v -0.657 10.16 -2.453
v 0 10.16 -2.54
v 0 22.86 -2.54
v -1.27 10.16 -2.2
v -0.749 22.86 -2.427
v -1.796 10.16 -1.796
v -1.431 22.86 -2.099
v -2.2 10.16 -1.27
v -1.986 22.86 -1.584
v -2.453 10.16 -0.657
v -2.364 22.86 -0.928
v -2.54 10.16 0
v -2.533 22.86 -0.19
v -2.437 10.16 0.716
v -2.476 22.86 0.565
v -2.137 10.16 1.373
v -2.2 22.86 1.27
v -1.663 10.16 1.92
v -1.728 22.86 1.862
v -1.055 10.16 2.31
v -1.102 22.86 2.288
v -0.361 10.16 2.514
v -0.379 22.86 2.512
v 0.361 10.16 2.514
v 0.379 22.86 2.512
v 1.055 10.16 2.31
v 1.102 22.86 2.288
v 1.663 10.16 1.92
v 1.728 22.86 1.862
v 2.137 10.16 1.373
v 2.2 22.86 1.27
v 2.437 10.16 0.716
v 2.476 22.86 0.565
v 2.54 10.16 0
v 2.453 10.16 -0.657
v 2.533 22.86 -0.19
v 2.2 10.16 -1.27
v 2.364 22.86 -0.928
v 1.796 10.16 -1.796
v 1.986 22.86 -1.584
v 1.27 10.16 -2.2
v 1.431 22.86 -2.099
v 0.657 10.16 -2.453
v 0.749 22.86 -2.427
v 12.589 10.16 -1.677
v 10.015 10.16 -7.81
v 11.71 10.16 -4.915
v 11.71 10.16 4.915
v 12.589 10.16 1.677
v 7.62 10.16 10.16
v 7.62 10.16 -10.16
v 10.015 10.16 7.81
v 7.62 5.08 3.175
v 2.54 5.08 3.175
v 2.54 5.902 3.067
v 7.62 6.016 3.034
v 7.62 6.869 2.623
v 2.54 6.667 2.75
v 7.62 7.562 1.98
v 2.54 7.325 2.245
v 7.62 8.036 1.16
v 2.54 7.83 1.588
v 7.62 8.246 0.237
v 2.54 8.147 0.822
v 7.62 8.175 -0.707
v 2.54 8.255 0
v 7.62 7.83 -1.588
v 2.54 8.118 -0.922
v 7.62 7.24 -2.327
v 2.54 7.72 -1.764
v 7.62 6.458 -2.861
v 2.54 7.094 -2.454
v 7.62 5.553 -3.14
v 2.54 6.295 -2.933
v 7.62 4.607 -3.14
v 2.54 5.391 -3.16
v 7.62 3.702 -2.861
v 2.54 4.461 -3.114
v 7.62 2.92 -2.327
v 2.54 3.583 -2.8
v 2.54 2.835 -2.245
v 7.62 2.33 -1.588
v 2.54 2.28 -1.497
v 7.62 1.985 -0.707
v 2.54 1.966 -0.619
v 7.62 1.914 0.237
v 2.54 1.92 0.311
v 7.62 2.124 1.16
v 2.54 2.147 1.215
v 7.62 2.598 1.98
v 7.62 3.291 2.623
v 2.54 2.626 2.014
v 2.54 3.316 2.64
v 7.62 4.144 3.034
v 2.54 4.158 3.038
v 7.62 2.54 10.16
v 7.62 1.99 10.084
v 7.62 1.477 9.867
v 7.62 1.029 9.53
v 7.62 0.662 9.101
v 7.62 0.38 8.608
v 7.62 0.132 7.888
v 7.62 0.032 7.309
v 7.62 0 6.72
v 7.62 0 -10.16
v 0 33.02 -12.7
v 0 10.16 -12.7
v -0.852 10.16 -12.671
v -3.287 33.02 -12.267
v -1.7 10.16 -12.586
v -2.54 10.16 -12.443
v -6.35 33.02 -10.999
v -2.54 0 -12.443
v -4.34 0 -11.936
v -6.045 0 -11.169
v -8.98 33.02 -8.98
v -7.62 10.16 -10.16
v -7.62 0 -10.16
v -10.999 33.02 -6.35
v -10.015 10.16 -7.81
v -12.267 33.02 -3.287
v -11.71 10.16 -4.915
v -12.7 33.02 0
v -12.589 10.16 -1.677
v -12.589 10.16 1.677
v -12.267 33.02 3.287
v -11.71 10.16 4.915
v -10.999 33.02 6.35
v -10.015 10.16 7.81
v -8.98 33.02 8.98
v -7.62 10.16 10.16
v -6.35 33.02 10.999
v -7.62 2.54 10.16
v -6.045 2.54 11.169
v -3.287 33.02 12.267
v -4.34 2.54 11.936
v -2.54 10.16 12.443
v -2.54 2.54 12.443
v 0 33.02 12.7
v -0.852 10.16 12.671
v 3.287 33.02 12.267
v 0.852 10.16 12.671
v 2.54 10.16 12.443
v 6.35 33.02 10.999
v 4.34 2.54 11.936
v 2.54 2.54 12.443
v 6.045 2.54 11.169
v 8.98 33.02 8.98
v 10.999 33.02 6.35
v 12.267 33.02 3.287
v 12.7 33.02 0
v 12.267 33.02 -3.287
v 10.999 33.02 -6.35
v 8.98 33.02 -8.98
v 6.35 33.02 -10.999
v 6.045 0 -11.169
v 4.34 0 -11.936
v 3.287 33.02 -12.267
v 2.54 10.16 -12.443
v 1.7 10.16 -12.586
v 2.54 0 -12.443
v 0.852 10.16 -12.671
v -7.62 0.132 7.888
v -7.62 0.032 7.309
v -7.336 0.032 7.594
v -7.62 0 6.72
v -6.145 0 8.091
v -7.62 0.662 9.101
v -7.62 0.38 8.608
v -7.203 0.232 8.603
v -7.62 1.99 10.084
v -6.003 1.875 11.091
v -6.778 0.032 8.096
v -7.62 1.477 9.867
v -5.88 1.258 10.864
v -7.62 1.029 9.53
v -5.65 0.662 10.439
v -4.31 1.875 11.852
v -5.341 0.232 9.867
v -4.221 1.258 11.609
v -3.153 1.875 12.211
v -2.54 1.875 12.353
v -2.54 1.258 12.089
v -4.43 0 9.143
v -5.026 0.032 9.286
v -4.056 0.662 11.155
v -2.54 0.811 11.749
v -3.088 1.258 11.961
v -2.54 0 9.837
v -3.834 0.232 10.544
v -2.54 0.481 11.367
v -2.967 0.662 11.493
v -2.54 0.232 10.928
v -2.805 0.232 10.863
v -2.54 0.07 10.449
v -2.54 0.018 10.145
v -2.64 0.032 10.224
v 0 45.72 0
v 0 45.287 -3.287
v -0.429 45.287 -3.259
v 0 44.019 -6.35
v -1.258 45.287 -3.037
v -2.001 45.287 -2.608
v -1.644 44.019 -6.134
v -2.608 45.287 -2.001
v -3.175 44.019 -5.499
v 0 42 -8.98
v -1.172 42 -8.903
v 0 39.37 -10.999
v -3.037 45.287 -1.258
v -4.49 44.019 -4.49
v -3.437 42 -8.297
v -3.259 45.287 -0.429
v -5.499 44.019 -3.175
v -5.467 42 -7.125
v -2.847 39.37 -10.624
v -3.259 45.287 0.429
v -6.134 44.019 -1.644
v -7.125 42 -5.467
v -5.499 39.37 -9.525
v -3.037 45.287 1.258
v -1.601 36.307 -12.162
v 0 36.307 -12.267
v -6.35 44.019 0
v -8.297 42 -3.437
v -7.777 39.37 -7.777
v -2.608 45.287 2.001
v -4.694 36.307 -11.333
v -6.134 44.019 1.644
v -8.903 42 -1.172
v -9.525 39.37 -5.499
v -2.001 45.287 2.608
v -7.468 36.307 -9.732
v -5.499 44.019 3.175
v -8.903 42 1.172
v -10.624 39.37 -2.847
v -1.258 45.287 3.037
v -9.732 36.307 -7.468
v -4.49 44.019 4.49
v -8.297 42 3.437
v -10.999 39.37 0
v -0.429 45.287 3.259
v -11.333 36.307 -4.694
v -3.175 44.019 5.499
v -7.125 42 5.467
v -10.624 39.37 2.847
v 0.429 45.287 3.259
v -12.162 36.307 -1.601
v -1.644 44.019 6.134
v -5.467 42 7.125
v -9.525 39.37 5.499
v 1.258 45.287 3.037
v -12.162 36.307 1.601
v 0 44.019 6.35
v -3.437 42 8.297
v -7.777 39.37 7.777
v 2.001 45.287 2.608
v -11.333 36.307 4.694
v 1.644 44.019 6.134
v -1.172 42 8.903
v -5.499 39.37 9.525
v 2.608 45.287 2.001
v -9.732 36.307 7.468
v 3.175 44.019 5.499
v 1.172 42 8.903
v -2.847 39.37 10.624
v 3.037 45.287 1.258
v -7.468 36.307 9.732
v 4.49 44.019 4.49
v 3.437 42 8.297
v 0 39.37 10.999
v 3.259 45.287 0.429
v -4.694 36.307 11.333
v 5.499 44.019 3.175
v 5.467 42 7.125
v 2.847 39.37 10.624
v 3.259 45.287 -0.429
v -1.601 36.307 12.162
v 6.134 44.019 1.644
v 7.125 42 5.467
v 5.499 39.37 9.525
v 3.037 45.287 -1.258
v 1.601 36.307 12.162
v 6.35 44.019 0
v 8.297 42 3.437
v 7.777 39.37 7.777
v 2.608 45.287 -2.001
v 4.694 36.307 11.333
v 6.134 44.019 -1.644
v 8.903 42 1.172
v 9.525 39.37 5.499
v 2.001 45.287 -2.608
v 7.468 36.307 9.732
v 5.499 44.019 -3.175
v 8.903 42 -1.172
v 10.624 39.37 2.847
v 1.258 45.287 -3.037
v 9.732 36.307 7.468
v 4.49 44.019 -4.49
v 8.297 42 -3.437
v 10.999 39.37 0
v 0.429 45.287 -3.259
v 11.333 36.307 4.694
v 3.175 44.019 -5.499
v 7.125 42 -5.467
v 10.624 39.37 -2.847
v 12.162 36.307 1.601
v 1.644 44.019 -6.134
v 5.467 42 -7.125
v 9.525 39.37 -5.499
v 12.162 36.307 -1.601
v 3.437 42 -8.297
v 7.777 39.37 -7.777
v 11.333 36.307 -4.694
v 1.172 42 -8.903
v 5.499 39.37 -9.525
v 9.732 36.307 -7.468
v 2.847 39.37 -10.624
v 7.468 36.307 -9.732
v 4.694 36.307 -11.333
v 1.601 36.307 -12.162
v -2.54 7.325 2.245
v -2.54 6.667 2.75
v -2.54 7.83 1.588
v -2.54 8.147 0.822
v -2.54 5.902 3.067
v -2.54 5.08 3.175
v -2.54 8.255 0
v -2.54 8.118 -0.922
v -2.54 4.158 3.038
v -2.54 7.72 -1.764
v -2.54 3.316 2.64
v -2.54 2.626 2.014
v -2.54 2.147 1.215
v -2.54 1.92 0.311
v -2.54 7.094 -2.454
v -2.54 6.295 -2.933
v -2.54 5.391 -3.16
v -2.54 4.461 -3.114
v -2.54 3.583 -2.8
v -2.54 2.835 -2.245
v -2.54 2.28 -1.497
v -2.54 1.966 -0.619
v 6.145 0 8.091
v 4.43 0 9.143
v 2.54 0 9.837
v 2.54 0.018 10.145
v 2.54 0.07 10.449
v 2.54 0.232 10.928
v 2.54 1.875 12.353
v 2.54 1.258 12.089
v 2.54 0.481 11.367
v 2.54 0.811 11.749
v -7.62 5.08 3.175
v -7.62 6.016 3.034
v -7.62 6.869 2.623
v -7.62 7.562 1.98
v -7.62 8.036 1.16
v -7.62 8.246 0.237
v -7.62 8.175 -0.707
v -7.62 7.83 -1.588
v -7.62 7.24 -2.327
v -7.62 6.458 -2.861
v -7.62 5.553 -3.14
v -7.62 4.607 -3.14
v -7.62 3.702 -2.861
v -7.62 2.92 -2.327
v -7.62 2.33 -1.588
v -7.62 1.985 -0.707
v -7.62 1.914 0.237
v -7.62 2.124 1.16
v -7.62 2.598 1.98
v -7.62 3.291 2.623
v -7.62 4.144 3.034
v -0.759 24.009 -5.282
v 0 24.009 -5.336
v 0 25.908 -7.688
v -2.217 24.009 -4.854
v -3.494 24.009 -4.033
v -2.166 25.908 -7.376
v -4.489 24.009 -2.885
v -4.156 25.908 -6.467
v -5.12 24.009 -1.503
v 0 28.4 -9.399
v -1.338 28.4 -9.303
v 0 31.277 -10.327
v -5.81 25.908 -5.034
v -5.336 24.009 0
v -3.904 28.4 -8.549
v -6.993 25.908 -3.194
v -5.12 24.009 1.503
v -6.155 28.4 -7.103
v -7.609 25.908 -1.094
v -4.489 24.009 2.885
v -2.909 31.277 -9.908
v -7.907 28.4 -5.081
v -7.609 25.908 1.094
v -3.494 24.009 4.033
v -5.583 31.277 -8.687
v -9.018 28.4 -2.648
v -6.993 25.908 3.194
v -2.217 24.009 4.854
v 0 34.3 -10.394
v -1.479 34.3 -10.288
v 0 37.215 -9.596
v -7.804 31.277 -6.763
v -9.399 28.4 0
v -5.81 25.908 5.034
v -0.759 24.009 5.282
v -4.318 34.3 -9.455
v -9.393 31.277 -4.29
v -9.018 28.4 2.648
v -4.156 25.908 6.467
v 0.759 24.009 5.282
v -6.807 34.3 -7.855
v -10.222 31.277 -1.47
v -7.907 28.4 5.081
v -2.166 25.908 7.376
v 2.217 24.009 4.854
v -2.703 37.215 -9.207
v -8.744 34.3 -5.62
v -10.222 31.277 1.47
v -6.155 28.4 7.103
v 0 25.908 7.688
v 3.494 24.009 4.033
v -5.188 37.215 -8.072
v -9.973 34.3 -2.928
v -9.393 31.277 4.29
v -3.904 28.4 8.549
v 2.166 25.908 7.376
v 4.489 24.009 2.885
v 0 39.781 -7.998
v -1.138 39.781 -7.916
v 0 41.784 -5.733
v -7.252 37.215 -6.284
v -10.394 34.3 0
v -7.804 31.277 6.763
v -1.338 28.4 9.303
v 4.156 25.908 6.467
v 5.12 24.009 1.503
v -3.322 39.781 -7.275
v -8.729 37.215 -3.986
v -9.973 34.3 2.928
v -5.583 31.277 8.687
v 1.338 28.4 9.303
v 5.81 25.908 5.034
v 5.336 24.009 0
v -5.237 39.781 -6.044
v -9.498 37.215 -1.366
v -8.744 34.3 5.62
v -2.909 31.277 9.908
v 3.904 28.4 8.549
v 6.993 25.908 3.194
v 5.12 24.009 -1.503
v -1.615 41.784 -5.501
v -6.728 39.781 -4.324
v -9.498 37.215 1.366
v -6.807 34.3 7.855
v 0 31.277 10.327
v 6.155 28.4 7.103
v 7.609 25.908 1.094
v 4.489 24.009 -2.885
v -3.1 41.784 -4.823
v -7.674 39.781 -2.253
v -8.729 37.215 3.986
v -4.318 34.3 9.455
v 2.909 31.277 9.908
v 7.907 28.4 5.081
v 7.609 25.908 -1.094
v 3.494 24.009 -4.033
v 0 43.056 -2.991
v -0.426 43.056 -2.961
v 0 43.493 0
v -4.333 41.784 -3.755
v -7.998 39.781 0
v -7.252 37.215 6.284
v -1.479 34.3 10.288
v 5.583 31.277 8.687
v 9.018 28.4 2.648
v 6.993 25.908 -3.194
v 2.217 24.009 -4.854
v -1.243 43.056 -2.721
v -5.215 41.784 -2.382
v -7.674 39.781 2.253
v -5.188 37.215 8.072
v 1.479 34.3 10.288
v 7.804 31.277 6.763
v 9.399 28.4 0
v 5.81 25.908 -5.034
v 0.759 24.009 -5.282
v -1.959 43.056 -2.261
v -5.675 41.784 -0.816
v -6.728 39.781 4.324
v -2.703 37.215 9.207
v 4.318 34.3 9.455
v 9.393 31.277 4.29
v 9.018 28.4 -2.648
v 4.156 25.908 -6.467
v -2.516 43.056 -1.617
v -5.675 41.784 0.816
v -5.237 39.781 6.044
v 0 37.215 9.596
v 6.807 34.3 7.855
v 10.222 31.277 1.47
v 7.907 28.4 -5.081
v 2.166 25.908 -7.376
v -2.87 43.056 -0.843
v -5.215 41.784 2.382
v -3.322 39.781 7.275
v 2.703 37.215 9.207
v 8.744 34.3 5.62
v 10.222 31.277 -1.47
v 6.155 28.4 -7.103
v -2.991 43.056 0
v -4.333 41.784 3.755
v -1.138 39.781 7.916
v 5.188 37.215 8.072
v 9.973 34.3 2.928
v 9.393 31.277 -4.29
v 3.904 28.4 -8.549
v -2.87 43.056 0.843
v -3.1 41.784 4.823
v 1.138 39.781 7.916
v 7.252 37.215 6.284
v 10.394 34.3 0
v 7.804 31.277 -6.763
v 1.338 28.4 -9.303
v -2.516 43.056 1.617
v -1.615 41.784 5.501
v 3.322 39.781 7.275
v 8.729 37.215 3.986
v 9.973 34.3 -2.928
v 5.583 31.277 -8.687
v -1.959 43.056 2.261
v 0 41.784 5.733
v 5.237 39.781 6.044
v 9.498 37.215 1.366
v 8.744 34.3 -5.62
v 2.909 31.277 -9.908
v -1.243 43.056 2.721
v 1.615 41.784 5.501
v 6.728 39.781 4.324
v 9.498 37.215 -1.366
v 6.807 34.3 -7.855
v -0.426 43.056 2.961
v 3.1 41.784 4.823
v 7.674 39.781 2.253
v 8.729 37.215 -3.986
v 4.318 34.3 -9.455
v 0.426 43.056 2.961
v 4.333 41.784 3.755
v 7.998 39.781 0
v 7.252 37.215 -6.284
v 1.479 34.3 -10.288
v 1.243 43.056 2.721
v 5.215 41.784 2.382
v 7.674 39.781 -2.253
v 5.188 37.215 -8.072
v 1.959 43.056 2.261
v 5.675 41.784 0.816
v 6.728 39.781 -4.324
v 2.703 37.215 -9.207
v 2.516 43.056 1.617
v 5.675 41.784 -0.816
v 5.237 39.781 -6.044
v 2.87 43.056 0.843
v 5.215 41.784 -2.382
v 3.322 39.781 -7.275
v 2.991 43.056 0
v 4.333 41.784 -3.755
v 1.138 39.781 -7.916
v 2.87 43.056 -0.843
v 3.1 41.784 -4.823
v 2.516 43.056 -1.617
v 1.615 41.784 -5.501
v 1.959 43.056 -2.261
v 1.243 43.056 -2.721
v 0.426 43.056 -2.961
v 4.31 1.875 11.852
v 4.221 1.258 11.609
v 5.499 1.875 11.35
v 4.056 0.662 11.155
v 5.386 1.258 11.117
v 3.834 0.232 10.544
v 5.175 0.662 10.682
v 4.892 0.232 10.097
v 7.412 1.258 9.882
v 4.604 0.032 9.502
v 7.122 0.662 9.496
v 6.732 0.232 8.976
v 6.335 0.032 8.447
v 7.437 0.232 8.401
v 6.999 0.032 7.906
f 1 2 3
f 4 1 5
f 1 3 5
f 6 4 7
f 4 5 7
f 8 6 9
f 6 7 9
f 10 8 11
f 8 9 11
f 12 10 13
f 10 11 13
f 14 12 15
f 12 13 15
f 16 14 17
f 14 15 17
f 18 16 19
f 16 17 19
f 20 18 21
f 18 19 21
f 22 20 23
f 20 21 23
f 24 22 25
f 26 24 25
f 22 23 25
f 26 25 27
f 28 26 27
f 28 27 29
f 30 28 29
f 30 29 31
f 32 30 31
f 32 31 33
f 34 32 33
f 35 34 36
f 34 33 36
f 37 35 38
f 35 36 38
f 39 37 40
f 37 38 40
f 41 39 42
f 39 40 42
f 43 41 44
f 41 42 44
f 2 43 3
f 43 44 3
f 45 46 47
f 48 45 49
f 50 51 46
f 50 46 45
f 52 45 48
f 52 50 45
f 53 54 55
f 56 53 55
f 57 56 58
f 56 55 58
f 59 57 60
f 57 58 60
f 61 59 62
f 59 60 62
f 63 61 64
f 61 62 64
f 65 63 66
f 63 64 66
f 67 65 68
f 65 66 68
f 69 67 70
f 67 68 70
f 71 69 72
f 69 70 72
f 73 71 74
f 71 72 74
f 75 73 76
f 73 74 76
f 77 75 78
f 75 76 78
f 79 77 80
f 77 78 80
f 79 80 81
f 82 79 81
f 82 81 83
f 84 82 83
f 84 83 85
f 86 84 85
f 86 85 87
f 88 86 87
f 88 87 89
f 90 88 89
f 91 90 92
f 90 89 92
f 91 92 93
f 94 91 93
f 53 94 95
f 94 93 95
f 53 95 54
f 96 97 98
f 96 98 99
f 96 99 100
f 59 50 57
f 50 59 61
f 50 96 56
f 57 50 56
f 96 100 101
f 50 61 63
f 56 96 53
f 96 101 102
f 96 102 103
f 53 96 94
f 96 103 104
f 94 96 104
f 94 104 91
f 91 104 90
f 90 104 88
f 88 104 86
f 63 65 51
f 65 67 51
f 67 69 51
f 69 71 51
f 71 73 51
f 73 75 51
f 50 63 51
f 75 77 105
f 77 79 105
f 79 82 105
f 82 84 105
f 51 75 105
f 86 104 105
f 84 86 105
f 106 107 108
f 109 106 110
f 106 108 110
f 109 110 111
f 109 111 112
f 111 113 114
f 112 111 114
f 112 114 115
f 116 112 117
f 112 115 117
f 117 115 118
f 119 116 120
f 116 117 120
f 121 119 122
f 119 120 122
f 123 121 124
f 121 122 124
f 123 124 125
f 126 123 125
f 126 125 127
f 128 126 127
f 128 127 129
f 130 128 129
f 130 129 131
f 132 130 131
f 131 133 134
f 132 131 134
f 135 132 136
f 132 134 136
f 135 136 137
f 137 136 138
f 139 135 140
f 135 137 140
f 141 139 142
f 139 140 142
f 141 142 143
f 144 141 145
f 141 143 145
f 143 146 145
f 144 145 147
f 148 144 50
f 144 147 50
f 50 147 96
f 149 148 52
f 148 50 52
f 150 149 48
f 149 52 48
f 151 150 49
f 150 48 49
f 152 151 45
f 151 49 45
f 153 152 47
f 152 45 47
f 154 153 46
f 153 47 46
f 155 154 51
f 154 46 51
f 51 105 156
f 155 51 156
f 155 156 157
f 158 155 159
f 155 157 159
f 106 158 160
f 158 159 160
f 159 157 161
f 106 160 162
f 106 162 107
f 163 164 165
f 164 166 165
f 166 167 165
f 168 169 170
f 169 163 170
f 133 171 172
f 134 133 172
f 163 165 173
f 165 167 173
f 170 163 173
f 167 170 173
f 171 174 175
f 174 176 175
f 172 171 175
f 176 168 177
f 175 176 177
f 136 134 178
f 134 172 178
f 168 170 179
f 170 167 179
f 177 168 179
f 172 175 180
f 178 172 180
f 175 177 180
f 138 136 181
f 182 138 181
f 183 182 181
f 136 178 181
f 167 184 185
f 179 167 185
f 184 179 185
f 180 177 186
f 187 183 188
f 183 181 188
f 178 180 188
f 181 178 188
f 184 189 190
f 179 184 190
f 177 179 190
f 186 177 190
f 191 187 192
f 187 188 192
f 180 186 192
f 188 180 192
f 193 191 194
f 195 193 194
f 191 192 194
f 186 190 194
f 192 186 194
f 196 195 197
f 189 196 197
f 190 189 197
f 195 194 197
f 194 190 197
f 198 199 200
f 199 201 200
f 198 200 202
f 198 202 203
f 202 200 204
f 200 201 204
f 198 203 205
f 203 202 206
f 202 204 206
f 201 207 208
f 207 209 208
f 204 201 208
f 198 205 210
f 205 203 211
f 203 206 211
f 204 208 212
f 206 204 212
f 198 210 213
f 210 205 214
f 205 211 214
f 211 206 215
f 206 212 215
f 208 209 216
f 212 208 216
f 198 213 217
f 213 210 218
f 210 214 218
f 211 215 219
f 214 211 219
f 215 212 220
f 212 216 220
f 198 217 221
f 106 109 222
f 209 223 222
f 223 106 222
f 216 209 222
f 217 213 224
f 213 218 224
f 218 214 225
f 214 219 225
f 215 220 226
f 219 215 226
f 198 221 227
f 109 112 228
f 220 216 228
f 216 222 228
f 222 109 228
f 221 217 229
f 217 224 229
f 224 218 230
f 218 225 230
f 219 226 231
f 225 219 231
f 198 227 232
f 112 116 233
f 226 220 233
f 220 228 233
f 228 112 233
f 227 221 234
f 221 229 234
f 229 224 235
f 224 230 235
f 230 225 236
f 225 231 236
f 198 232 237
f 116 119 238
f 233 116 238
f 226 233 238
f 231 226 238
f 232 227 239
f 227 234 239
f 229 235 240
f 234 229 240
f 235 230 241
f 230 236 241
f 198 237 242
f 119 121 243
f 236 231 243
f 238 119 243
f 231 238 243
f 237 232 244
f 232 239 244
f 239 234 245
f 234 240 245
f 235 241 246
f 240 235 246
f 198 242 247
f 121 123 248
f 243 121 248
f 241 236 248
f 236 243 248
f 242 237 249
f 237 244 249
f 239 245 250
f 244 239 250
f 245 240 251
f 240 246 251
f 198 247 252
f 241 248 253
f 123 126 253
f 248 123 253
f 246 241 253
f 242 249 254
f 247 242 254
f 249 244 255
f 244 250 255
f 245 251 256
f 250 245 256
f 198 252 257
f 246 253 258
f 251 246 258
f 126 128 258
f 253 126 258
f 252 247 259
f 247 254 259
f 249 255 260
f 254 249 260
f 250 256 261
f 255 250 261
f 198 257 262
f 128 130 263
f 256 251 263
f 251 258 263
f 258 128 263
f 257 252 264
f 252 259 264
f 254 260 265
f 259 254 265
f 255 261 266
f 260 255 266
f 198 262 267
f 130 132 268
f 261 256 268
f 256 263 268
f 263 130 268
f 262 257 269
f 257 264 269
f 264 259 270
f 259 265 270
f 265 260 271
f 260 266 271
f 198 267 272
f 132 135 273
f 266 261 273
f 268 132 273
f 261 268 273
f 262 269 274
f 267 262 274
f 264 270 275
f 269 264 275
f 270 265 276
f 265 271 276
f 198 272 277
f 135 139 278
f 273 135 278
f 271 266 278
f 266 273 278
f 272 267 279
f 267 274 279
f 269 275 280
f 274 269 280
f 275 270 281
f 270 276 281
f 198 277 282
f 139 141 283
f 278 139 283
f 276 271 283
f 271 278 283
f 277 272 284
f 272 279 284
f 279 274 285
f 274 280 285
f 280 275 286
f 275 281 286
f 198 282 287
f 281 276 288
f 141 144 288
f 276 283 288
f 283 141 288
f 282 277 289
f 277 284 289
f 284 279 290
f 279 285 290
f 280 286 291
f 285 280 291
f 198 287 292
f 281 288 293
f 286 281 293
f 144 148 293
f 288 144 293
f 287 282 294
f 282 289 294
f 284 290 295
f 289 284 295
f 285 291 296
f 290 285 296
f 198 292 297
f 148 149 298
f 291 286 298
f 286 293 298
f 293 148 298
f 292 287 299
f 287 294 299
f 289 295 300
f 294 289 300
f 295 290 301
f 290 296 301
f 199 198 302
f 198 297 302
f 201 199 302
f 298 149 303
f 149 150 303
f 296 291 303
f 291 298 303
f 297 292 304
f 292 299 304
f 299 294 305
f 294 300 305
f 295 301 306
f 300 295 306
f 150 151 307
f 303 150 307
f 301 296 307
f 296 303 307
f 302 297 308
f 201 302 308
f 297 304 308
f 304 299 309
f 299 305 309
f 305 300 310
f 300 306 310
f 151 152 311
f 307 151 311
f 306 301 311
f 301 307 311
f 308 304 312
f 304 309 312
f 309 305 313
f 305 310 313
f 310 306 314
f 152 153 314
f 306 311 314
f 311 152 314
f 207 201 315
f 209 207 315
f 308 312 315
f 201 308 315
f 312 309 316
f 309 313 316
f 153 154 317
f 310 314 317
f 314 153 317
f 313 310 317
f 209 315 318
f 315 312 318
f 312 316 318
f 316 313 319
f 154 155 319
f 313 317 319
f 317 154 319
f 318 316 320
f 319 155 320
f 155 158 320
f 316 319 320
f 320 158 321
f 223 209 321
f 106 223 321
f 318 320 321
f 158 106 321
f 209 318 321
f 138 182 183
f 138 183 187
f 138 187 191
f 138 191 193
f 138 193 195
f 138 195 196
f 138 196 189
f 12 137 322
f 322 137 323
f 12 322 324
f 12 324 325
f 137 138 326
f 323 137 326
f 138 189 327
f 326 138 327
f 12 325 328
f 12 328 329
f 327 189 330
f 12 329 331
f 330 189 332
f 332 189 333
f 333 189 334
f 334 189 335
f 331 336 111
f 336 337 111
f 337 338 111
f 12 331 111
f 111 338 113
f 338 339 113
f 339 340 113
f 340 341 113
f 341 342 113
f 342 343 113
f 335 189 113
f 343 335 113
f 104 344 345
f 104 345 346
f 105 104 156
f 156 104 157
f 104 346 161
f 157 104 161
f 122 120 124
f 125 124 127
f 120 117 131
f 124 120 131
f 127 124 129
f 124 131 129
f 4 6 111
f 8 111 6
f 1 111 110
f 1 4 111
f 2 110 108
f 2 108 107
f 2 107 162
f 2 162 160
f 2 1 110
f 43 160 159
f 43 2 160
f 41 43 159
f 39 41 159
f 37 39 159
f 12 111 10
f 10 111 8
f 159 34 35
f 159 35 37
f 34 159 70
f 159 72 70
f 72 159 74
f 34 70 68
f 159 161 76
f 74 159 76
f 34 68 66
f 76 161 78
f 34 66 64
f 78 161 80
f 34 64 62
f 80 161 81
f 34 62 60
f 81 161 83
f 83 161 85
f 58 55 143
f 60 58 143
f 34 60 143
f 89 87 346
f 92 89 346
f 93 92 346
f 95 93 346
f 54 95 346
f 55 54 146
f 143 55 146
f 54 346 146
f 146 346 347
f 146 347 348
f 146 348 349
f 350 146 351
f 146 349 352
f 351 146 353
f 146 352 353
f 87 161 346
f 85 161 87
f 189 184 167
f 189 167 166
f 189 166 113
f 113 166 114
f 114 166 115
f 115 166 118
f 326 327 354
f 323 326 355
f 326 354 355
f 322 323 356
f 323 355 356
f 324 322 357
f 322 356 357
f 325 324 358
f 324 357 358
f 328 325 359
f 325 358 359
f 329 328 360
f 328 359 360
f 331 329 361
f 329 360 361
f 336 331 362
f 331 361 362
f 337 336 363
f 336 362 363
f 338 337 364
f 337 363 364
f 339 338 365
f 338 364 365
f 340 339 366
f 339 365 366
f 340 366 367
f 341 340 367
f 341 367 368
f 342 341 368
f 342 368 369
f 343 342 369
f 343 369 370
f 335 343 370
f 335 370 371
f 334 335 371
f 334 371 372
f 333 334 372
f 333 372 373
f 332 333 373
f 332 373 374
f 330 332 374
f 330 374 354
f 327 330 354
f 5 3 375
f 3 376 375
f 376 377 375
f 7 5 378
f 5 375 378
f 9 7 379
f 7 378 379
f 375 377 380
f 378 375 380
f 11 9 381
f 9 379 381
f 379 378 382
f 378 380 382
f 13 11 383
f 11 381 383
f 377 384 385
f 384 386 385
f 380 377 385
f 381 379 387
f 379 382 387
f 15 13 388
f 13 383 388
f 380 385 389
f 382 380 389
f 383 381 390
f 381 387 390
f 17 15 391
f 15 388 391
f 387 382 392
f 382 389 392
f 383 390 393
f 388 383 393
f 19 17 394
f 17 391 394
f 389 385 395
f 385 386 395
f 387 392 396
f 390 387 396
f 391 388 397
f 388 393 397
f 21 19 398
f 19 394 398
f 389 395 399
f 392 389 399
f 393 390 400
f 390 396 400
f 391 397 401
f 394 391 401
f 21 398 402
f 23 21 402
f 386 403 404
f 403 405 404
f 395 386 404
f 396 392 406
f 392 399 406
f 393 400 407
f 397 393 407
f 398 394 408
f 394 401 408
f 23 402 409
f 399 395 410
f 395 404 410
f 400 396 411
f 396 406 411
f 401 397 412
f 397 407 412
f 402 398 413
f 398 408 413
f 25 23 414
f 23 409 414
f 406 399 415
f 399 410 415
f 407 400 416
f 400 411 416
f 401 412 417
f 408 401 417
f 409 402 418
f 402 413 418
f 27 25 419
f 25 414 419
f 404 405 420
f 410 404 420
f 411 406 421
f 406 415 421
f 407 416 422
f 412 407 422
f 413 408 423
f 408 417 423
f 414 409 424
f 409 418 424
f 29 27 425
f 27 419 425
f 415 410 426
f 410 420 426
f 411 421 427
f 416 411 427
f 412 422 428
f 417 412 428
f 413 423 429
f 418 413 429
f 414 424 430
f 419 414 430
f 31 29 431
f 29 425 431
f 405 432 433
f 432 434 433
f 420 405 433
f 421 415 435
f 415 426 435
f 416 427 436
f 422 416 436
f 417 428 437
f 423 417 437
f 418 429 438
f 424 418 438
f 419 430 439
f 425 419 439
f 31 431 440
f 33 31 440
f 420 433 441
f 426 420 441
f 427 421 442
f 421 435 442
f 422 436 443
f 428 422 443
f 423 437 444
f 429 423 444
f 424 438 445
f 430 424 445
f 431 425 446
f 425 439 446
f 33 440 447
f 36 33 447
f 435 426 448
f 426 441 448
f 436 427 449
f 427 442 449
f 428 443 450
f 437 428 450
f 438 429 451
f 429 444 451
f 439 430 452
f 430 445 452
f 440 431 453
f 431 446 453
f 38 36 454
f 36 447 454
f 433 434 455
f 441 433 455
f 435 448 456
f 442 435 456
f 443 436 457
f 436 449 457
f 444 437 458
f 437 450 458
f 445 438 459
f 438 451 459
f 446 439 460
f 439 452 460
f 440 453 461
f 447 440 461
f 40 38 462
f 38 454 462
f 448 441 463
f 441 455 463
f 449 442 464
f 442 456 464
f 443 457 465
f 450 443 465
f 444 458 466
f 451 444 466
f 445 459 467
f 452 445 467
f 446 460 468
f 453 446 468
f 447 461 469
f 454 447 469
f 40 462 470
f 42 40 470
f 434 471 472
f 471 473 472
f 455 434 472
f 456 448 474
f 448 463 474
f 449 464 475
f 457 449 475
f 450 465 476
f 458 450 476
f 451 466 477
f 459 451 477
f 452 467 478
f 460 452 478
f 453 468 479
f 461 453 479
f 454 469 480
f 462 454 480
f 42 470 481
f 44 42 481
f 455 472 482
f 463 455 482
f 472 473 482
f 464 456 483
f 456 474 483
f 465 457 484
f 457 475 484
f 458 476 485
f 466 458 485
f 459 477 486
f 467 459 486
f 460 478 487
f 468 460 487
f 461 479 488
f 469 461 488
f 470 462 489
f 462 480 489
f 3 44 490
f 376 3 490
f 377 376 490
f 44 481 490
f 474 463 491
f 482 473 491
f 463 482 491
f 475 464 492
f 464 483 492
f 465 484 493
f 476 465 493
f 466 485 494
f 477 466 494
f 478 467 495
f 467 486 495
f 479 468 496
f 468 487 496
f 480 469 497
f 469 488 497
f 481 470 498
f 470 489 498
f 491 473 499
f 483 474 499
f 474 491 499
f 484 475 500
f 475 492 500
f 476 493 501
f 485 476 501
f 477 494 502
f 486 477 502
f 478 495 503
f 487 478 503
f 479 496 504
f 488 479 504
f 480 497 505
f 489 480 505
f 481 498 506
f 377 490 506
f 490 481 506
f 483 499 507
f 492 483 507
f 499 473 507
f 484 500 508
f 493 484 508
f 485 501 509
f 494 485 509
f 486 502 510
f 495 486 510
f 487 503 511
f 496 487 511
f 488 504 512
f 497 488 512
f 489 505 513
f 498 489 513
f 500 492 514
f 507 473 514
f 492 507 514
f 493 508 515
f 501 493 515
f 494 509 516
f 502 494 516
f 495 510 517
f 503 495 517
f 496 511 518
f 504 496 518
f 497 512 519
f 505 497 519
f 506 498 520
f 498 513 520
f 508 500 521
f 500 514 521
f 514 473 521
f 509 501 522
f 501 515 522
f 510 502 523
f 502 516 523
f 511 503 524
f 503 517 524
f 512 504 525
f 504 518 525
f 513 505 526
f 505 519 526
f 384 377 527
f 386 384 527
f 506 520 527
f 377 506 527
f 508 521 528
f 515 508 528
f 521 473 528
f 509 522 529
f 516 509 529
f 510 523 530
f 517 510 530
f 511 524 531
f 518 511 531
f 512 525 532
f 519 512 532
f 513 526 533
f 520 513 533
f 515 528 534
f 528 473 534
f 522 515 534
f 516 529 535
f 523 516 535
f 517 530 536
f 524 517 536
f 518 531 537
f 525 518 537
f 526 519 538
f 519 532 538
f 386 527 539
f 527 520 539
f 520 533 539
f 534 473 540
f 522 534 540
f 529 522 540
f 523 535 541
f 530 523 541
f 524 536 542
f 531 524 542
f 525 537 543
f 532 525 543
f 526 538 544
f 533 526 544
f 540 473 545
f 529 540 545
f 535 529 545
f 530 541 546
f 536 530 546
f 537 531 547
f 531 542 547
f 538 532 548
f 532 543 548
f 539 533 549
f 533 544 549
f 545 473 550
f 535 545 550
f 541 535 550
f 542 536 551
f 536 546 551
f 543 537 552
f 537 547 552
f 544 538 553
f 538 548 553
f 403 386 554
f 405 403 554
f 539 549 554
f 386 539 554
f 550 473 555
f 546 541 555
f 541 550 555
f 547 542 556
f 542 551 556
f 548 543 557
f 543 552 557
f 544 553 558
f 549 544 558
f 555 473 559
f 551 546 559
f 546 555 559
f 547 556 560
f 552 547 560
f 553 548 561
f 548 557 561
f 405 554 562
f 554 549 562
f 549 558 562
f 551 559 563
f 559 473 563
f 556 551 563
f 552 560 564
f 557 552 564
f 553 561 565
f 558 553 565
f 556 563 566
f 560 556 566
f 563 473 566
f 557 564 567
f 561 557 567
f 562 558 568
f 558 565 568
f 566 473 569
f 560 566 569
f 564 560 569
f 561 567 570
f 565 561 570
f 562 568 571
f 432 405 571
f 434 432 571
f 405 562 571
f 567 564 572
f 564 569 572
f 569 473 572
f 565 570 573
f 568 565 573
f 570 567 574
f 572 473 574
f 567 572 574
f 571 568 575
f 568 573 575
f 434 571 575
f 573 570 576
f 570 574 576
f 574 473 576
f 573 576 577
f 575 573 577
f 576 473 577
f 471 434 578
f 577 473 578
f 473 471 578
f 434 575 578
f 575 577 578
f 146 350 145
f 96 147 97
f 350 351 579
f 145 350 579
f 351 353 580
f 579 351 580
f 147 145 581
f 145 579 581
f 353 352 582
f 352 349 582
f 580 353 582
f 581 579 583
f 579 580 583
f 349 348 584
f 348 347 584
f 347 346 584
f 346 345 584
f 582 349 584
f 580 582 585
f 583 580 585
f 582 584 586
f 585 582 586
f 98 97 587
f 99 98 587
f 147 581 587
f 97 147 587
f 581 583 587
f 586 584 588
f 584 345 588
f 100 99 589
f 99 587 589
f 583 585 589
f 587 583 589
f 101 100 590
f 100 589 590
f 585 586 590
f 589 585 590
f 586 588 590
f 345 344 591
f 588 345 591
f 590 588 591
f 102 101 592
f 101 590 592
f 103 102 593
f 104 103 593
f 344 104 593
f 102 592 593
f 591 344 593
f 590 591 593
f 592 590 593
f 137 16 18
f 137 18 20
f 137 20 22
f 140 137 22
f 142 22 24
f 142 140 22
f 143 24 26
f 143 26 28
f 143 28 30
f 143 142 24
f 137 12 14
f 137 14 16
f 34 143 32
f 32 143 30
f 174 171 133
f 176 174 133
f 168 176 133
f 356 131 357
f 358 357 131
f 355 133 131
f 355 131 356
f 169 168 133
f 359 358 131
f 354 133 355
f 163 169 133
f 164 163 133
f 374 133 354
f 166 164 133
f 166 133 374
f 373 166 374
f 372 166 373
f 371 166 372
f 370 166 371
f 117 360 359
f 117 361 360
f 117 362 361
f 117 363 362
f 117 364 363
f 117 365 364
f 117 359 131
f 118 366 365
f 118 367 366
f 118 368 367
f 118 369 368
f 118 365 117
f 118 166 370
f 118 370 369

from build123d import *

# Parameters (mm, degrees)
CUT_EXTRUDE1_DEPTH = 10.16
SKETCH3_R          = 3.175
CUT_EXTRUDE2_DEPTH = 52.61889964
FILLET1_R          = 2.54


with BuildPart() as part:
    # Sketch1 → Revolve1 (revolve)
    with BuildSketch(Plane.XY, mode=Mode.PRIVATE) as revolve1_sk:
        with BuildLine():
            Line((0, 0), (0, 5.602635041))
            Line((0, 5.602635041), (-2.54, 5.602635041))
            Line((-2.54, 5.602635041), (-2.54, 22.86))
            ThreePointArc((-2.54, 22.86), (-10.394222266, 34.299587235), (0, 43.492688289))
            Line((0, 43.492688289), (0, 45.72))
            ThreePointArc((0, 45.72), (-8.980256121, 42.000256121), (-12.7, 33.02))
            Line((-12.7, 33.02), (-12.7, 0))
            Line((-12.7, 0), (0, 0))
        make_face()
    revolve(revolve1_sk.sketch.rotate(Axis((0, 0, 0), (0, 1, 0)), 270), axis=Axis((0, 0, 0), (0, 1, 0)))

    # Sketch2 → Cut-Extrude1 (cut)
    with BuildSketch(Plane.XZ):
        with BuildLine():
            Line((-2.54, 12.443407893), (-2.54, -12.443407893))
            ThreePointArc((-2.54, -12.443407893), (0, -12.7), (2.54, -12.443407893))
            Line((2.54, -12.443407893), (2.54, 12.443407893))
            ThreePointArc((2.54, 12.443407893), (0, 12.7), (-2.54, 12.443407893))
        make_face()
        with BuildLine():
            Line((-7.62, 10.16), (-7.62, -10.16))
            ThreePointArc((-7.62, -10.16), (-12.7, 0), (-7.62, 10.16))
        make_face()
        with BuildLine():
            Line((7.62, 10.16), (7.62, -10.16))
            ThreePointArc((7.62, -10.16), (12.7, 0), (7.62, 10.16))
        make_face()
    extrude(amount=-CUT_EXTRUDE1_DEPTH, mode=Mode.SUBTRACT)

    # Sketch3 → Cut-Extrude2 (cut, through all)
    with BuildSketch(Plane.ZY.offset(7.62)):
        with Locations((0, 5.08)):
            Circle(SKETCH3_R)
    extrude(amount=-CUT_EXTRUDE2_DEPTH, mode=Mode.SUBTRACT)

    # Fillet1
    fillet1_edges = [part.edges().sort_by_distance(p)[0] for p in [
        (5.206715654, 0, 11.583613948),
        (-5.206715654, 0, 11.583613948),
    ]]
    fillet(fillet1_edges, radius=FILLET1_R)


solid = part.part
